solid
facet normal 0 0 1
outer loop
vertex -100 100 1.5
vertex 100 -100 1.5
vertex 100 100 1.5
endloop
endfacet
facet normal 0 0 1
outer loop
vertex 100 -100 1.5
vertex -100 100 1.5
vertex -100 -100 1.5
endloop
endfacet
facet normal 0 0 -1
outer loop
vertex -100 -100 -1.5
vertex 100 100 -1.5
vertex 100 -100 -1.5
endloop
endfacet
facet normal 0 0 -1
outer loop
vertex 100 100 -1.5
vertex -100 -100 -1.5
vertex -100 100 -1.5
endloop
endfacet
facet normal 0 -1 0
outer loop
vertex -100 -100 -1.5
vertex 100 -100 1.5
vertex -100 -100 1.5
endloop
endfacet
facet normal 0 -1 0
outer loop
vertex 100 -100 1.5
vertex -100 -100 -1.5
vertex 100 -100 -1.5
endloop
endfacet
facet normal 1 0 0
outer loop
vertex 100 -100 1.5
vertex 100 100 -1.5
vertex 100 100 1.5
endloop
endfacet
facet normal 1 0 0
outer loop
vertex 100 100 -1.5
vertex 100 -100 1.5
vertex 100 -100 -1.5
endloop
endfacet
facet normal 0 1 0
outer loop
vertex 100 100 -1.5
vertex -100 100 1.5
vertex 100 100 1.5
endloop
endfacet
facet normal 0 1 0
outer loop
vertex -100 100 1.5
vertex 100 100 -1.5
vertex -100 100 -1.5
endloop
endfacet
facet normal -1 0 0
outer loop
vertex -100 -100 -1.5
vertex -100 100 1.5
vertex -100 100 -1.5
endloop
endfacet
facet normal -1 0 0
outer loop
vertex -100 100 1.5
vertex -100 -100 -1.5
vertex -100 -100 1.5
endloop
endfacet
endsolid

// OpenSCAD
$fn=64;

module sheet_mild_steel(length=200, width=200, thickness=3) {
    translate([-length/2, -width/2, -thickness/2])
        cube([length, width, thickness], center=false);
}

sheet_mild_steel();
